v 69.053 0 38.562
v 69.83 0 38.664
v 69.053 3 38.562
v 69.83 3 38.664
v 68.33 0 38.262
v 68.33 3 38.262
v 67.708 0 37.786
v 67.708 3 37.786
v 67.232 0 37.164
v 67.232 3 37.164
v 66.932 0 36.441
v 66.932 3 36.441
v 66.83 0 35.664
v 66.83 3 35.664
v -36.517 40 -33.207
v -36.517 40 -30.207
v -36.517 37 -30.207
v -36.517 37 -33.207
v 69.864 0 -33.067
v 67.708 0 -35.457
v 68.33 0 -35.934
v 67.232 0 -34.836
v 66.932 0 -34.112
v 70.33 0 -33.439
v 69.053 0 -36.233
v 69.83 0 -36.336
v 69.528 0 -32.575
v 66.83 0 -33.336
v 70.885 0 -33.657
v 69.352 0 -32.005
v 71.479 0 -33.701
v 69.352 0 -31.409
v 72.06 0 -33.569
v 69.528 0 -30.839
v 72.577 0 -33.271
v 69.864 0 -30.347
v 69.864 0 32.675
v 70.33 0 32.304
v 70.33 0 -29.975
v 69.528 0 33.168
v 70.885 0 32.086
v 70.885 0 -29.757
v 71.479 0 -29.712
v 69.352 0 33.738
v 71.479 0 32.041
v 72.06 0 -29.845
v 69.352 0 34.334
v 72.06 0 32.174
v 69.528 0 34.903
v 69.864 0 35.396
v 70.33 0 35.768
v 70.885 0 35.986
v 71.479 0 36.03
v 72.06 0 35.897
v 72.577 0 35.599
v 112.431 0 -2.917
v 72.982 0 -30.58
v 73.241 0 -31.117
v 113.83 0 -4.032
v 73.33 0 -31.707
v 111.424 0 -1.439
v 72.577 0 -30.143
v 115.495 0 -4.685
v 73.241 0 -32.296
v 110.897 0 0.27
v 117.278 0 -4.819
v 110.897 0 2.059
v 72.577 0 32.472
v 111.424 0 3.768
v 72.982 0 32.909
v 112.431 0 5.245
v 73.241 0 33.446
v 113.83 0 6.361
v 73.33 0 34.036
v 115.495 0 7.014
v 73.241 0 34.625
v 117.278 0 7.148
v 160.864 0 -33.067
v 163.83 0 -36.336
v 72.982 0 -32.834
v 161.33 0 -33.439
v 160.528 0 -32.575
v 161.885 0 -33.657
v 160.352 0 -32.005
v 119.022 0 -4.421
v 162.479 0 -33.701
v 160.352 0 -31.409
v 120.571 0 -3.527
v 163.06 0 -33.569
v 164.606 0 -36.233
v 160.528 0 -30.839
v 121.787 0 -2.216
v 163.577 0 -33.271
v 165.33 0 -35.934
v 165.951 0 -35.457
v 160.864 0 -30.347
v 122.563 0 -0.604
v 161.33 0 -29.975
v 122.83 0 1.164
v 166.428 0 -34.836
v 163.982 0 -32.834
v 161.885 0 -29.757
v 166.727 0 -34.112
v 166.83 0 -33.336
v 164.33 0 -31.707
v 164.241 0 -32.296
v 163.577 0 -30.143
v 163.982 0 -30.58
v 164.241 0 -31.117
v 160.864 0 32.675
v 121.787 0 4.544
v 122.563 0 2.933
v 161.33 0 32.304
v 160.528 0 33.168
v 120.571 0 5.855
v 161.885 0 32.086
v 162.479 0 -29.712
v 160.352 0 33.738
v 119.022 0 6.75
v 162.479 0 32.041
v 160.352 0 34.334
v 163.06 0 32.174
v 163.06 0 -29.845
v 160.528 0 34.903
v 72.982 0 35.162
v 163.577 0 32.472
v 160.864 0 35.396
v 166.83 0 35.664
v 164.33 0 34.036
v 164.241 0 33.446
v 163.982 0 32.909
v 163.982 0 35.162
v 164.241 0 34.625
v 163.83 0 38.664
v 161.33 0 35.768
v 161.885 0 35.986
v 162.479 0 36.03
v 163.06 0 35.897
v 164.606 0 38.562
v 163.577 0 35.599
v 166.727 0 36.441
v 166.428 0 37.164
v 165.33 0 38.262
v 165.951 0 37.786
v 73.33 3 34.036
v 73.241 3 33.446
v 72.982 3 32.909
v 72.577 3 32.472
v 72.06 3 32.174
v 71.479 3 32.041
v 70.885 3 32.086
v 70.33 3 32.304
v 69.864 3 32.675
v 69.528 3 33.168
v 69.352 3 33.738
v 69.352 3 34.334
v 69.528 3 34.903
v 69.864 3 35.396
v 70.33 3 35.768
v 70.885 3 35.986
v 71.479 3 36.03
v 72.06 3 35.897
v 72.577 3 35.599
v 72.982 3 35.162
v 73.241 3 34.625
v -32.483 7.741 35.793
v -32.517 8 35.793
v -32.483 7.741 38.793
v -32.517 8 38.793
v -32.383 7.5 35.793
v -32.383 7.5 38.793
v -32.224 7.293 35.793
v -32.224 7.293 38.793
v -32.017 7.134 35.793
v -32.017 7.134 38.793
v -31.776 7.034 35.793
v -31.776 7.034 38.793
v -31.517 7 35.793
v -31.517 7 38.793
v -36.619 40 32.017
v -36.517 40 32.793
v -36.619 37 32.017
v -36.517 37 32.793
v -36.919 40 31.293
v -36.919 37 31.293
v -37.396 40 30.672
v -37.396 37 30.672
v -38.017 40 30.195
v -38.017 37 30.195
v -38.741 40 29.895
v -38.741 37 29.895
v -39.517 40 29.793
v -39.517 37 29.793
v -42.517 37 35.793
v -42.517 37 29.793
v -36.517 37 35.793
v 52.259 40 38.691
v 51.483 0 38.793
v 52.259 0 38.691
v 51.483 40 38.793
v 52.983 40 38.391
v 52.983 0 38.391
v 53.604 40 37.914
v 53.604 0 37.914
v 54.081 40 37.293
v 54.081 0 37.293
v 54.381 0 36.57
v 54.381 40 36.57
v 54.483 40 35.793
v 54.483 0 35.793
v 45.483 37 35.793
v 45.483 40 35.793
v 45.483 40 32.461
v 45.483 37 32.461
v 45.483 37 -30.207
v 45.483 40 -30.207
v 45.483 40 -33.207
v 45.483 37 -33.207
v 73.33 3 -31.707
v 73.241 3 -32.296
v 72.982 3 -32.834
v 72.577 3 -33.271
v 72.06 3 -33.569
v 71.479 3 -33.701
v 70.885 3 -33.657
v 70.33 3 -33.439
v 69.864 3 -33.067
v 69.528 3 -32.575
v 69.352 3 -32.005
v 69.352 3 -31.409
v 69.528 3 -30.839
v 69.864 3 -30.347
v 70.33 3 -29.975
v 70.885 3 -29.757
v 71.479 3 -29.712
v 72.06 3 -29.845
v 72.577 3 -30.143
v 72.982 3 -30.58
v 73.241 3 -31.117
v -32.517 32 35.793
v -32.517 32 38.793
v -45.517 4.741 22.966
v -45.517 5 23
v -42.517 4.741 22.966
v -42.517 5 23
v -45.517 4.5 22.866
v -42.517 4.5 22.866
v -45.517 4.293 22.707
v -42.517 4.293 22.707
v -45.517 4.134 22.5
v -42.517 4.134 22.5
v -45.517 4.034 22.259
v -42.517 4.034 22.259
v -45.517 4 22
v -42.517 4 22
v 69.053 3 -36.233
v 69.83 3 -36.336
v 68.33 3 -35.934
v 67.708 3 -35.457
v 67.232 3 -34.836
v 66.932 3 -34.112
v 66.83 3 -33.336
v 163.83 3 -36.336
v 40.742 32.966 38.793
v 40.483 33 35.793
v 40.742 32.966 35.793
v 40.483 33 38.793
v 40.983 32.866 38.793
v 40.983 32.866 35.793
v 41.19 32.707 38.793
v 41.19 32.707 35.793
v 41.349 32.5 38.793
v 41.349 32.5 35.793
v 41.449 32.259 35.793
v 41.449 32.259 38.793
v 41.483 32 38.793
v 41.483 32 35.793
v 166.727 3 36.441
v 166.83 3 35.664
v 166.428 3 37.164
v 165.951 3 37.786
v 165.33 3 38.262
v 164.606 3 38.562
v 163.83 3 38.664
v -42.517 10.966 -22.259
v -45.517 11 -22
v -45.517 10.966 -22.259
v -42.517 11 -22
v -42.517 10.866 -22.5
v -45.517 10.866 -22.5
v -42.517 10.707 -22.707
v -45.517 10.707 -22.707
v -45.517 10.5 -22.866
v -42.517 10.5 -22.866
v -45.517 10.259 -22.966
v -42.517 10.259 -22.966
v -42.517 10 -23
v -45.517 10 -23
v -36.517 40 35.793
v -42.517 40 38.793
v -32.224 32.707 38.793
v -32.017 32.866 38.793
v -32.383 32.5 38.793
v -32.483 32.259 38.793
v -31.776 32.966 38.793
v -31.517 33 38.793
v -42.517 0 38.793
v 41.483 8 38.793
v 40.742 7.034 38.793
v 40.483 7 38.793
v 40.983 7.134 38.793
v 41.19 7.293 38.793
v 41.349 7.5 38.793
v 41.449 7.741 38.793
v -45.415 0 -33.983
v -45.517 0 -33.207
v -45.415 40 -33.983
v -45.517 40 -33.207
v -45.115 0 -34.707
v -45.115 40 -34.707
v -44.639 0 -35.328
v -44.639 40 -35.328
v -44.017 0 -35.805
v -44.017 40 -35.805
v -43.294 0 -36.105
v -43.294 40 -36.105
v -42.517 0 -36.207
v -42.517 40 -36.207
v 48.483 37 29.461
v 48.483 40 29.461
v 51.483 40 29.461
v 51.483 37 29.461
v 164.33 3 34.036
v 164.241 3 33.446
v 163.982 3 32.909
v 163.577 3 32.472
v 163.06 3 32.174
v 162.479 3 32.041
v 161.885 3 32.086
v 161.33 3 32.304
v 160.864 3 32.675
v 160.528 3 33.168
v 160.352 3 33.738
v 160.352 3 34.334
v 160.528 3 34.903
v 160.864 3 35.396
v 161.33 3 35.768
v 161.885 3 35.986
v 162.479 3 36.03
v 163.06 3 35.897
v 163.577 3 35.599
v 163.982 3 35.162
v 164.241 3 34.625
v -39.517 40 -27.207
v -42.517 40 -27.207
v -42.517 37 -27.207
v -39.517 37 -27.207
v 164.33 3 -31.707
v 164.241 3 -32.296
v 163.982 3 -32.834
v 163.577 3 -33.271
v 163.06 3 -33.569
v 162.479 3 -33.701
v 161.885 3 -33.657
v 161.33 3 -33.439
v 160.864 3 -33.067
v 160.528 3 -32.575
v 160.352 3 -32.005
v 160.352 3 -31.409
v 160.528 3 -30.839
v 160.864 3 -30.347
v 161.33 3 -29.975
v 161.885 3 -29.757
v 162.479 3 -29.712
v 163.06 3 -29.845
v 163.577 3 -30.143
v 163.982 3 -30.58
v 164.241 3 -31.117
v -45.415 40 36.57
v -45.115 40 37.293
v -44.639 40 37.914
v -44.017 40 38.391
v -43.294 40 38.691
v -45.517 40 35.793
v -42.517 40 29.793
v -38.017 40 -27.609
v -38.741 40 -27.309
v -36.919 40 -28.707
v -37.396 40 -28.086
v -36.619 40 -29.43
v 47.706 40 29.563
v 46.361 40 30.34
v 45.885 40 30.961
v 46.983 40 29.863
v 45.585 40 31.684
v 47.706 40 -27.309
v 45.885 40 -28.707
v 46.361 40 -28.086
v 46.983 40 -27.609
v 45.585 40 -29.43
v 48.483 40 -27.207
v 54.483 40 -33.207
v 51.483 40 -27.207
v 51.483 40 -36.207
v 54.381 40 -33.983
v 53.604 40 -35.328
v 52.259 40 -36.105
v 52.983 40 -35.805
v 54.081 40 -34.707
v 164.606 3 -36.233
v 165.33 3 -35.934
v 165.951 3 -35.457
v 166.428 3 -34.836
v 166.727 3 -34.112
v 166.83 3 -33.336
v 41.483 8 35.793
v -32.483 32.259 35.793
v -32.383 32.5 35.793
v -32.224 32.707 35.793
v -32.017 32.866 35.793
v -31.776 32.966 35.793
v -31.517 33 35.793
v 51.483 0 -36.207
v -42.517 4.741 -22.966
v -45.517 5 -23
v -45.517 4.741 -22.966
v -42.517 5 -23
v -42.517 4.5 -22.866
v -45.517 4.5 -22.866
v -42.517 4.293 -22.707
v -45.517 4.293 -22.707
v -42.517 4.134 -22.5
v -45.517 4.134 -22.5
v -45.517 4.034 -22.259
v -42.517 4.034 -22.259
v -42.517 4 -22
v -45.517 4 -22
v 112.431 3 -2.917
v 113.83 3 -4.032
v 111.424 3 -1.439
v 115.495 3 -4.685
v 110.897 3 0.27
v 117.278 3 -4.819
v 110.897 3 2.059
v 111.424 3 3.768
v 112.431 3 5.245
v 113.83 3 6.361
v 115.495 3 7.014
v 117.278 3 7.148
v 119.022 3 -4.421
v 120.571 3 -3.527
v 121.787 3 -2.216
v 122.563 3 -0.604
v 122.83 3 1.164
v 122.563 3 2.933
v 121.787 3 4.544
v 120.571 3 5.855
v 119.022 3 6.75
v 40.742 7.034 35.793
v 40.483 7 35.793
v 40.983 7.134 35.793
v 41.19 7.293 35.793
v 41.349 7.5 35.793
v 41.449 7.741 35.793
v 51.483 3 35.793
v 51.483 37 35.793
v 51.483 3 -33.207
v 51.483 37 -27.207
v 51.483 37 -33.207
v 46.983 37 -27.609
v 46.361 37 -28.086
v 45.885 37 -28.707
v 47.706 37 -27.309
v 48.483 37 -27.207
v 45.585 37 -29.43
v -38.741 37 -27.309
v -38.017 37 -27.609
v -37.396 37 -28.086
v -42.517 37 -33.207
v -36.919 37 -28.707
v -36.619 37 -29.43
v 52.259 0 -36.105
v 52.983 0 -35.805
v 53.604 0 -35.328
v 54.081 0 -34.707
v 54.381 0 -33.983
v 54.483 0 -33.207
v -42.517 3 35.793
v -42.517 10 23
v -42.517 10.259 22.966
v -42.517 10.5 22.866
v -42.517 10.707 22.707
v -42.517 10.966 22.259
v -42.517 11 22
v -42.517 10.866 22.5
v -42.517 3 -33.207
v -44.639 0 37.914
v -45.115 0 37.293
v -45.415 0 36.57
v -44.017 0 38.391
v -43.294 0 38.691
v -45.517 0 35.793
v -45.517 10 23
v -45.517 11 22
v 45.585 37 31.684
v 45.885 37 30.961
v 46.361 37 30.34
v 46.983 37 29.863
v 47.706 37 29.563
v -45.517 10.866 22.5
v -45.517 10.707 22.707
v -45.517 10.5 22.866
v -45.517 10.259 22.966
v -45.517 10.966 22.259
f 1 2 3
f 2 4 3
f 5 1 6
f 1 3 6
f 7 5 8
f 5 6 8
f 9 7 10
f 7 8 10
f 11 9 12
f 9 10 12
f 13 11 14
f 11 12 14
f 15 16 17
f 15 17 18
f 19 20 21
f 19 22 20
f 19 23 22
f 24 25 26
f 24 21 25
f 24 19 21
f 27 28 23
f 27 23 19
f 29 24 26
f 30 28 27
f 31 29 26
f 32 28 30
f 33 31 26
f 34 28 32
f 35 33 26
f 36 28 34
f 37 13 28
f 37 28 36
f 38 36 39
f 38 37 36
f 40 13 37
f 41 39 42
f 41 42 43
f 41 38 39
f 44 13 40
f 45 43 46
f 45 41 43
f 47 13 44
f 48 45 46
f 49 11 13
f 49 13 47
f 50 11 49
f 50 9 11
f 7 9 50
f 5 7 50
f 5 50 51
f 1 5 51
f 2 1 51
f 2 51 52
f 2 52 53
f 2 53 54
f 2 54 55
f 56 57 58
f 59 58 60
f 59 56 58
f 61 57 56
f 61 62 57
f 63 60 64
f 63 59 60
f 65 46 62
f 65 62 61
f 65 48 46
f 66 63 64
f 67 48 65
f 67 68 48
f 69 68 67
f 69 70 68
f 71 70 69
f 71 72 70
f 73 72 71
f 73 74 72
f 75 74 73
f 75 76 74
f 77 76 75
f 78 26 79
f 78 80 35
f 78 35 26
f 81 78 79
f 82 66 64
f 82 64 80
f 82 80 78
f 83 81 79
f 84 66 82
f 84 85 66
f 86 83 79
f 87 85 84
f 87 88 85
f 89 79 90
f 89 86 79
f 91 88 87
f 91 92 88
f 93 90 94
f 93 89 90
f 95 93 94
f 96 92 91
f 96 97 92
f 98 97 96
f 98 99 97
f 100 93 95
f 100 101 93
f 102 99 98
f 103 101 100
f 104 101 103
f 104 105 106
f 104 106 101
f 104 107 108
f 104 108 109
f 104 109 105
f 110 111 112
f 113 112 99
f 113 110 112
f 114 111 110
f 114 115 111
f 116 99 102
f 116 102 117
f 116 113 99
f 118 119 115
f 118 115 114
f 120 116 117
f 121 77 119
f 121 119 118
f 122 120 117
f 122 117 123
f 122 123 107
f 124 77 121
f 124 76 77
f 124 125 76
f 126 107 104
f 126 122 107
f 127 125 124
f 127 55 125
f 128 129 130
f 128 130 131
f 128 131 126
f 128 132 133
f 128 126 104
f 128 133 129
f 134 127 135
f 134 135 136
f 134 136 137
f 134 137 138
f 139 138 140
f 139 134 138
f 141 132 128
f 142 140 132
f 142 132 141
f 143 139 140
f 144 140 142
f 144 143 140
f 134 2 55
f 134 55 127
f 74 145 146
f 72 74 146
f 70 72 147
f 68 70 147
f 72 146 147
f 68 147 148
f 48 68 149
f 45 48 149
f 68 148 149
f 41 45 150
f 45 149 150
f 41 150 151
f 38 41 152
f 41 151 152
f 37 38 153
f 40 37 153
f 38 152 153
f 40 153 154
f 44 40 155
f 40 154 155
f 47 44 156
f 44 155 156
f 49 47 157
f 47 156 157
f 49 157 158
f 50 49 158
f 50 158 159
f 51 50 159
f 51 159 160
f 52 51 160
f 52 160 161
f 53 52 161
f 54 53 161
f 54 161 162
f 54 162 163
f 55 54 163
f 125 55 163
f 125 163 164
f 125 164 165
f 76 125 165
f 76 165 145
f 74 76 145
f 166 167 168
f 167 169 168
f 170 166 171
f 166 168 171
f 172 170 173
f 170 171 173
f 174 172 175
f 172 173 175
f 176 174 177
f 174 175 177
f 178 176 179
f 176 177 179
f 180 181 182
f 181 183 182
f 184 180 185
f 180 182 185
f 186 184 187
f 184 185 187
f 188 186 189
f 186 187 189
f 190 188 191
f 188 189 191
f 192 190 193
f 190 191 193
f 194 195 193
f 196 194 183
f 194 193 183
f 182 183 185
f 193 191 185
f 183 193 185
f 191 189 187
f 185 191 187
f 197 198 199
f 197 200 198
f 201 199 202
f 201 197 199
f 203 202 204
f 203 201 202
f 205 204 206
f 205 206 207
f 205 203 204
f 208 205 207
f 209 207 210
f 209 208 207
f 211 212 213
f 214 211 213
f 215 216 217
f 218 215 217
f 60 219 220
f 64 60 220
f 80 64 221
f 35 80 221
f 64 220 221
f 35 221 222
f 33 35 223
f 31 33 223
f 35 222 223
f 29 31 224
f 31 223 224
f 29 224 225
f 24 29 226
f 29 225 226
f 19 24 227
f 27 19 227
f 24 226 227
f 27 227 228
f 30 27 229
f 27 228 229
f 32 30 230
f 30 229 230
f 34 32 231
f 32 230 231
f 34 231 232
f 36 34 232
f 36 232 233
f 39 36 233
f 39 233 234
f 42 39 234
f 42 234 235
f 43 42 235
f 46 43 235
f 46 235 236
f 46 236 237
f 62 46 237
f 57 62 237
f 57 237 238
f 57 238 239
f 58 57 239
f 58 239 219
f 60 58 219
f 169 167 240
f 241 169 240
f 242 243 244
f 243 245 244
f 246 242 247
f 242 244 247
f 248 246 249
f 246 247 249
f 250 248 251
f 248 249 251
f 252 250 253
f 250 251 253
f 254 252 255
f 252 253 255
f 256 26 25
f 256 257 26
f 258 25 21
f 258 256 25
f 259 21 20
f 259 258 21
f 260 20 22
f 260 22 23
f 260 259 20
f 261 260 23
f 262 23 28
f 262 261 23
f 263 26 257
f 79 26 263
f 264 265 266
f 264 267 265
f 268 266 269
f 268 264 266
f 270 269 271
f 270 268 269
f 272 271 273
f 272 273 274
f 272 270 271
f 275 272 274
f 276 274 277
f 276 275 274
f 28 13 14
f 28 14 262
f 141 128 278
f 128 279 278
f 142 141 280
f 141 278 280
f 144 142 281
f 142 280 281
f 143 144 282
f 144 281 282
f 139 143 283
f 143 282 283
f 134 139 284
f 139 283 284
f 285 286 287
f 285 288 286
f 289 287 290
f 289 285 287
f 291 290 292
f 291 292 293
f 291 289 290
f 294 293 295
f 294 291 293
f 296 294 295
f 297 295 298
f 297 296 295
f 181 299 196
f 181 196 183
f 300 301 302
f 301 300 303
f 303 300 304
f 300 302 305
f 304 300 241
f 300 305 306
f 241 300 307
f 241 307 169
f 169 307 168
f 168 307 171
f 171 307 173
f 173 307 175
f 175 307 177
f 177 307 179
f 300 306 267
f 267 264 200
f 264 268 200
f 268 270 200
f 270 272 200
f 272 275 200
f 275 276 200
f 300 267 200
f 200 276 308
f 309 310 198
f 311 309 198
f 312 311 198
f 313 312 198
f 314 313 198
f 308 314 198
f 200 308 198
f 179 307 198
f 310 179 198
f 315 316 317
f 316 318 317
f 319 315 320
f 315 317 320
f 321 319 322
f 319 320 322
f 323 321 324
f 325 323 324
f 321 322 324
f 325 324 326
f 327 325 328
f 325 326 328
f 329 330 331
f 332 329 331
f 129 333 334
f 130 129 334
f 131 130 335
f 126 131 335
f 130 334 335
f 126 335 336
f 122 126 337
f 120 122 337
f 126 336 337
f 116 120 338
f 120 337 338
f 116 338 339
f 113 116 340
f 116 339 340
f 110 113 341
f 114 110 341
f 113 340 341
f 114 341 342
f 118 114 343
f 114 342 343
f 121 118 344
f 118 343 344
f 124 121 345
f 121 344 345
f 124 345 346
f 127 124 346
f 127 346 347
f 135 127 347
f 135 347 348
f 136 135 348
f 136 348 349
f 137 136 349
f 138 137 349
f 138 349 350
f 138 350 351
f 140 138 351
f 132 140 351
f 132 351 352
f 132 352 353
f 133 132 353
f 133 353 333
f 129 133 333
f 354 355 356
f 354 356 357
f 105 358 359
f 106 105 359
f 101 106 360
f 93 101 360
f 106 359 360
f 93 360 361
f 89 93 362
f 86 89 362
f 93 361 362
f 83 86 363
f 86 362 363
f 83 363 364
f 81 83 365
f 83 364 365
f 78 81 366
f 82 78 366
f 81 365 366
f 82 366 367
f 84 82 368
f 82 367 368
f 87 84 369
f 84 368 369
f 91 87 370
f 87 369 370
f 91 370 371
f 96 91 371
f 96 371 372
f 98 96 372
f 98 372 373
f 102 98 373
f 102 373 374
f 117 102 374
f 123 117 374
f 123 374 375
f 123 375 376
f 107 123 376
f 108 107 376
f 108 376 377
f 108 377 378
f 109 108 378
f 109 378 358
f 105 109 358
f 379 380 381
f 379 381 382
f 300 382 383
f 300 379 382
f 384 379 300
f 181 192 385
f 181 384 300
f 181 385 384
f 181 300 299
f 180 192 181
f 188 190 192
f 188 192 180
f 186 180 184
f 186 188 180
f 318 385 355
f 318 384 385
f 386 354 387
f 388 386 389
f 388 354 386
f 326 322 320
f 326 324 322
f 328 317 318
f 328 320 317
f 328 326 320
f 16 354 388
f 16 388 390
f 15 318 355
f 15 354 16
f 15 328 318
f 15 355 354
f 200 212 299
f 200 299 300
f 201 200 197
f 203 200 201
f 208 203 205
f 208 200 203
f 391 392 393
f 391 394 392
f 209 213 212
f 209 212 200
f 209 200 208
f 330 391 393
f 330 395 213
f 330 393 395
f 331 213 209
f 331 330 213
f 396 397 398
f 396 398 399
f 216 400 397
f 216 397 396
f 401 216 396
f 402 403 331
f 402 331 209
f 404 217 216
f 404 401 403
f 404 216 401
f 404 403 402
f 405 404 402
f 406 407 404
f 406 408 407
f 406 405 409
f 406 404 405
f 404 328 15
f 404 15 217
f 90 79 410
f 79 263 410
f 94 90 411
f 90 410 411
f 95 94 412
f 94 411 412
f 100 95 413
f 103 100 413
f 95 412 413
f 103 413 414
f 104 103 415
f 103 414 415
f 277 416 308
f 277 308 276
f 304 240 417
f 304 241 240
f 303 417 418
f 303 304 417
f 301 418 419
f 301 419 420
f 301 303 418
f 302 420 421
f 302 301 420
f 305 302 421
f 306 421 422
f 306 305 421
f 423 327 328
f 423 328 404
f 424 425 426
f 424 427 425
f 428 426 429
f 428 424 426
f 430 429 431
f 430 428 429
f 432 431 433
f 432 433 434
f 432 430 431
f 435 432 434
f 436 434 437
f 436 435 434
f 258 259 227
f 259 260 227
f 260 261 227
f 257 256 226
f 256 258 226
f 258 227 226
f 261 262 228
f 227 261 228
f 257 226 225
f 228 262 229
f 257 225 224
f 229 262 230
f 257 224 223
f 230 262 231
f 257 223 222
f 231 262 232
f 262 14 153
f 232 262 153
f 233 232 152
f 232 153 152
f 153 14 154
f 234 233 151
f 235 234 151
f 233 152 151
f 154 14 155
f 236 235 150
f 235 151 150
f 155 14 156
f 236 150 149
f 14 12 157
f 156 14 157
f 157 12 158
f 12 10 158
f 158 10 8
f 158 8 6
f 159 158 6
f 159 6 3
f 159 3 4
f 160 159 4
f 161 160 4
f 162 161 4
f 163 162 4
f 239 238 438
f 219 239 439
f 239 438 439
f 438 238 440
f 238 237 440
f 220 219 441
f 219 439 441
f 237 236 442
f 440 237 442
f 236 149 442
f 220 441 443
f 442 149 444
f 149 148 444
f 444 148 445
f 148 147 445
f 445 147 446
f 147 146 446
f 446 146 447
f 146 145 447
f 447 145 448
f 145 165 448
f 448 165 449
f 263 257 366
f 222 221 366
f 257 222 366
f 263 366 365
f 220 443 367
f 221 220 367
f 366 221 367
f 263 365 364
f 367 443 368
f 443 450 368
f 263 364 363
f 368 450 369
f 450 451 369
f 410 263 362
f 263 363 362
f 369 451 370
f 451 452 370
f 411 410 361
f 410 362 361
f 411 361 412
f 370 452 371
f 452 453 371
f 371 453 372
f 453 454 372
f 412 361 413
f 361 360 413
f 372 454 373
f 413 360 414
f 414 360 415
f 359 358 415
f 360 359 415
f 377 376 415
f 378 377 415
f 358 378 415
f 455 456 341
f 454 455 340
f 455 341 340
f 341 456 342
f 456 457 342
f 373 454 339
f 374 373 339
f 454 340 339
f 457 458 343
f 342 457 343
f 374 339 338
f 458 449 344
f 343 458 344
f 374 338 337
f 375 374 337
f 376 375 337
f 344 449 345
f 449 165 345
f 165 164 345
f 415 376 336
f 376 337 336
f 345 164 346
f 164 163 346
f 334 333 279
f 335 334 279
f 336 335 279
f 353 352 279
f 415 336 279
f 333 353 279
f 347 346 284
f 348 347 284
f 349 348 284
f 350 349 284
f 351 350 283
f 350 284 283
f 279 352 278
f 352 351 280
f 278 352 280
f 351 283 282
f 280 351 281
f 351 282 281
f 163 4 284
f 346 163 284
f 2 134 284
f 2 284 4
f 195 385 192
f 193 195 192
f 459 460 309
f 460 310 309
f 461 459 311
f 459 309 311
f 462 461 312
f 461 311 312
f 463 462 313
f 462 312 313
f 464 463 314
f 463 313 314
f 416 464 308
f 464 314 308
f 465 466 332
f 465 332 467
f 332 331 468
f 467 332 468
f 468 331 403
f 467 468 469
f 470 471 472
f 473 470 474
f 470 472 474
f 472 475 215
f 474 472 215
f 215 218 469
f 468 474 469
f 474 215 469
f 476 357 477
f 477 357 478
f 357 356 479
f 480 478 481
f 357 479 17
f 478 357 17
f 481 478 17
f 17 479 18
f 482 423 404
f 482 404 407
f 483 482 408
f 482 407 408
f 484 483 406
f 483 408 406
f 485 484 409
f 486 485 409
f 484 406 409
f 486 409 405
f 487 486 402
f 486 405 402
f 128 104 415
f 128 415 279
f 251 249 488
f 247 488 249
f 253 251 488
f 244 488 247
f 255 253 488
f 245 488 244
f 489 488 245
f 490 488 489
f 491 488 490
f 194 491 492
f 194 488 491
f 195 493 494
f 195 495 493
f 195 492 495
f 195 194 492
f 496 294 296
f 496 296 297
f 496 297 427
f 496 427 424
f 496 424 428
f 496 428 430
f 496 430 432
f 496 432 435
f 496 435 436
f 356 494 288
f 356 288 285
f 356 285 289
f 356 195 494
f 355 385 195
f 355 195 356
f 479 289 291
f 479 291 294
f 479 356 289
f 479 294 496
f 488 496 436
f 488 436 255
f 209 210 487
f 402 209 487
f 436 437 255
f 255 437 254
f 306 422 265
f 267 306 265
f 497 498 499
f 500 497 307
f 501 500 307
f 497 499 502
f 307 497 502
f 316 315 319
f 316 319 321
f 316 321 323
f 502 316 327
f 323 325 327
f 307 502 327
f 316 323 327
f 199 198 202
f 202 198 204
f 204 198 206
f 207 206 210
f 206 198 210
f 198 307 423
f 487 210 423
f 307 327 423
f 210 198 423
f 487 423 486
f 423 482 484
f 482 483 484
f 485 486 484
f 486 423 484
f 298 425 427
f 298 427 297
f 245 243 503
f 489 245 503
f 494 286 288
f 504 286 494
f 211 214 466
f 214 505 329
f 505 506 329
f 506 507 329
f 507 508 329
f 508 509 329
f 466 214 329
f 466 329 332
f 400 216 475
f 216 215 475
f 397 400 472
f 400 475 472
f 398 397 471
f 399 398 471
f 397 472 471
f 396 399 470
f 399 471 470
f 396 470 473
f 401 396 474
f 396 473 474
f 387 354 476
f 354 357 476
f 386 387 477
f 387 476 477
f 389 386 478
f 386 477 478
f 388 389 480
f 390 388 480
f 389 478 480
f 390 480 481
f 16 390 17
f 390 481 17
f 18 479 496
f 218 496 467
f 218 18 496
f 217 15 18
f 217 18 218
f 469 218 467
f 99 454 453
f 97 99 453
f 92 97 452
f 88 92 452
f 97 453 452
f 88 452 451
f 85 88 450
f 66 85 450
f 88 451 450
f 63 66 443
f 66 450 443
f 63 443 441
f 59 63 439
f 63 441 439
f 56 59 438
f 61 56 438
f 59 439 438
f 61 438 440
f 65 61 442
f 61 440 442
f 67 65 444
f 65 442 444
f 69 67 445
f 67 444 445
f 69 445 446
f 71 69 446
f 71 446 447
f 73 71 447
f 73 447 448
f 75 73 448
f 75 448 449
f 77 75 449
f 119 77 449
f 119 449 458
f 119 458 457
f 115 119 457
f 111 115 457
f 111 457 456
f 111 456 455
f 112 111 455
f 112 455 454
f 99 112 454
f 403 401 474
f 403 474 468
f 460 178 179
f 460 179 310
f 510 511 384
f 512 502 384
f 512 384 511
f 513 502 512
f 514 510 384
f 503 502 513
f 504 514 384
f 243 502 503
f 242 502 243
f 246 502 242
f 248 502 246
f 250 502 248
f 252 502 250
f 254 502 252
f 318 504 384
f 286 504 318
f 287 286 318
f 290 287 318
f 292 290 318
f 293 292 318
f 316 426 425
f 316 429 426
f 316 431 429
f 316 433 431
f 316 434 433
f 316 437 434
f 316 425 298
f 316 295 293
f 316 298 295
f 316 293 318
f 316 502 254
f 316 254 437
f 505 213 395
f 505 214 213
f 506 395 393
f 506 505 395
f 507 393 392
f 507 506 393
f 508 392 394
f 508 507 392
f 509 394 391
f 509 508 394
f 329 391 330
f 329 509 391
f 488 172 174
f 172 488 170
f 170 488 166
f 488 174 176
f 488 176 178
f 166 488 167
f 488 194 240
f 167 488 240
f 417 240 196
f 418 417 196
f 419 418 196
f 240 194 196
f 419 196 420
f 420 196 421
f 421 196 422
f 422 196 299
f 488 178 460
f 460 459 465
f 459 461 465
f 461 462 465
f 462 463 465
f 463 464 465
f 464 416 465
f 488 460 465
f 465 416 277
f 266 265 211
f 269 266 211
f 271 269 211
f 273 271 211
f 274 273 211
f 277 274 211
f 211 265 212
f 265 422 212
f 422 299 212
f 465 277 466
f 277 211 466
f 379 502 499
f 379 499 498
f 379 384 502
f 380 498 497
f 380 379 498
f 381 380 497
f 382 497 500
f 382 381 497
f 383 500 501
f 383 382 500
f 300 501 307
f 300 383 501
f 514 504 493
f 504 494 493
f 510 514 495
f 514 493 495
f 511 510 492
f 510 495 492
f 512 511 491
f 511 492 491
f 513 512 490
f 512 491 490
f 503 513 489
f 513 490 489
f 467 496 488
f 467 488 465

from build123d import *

# Parameters (mm, degrees)
IZIM2_W                     = 100
IZIM2_H                     = 75
Y_KSEKLIK_EKSTR_ZYON1_DEPTH = 40
IZIM4_W                     = 94
IZIM4_H                     = 69
KES_EKSTR_ZYON1_DEPTH       = 37
IZIM6_W                     = 74
IZIM6_H                     = 26
KES_EKSTR_ZYON2_DEPTH       = 218
IZIM7_W                     = 46
IZIM7_H                     = 7
KES_EKSTR_ZYON3_DEPTH       = 30
RADYUS1_R                   = 3
IZIM9_W                     = 6
IZIM9_H                     = 6
Y_KSEKLIK_EKSTR_ZYON2_DEPTH = 3
RADYUS2_R                   = 3
IZIM11_W                    = 6
IZIM11_H                    = 6
Y_KSEKLIK_EKSTR_ZYON3_DEPTH = 3
RADYUS3_R                   = 3
IZIM12_W                    = 6
IZIM12_H                    = 6
Y_KSEKLIK_EKSTR_ZYON4_DEPTH = 3
IZIM13_W                    = 6
IZIM13_H                    = 6.332172704
Y_KSEKLIK_EKSTR_ZYON5_DEPTH = 3
RADYUS4_R                   = 3
RADYUS5_R                   = 1
RADYUS7_R                   = 1
Y_KSEKLIK_EKSTR_ZYON6_DEPTH = 3
RADYUS10_R                  = 3
IZIM16_R                    = 6
KES_EKSTR_ZYON4_DEPTH       = 31
KES_EKSTR_ZYON4_DEPTH_BACK  = 34
IZIM17_R                    = 2
KES_EKSTR_ZYON5_DEPTH       = 20


with BuildPart() as part:
    # Çizim2 → Yükseklik-Ekstrüzyon1 (new body)
    with BuildSketch(Plane(origin=(0, 0, 0), x_dir=(1, 0, 0), z_dir=(0, 1, 0))):
        with Locations((4.482758621, -1.293103448)):
            Rectangle(IZIM2_W, IZIM2_H)
    extrude(amount=Y_KSEKLIK_EKSTR_ZYON1_DEPTH)

    # Çizim4 → Kes-Ekstrüzyon1 (cut)
    with BuildSketch(Plane(origin=(0, 40, 0), x_dir=(1, 0, 0), z_dir=(0, 1, 0))):
        with Locations((4.482758621, -1.293103448)):
            Rectangle(IZIM4_W, IZIM4_H)
    extrude(amount=-KES_EKSTR_ZYON1_DEPTH, mode=Mode.SUBTRACT)

    # Çizim6 → Kes-Ekstrüzyon2 (cut)
    with BuildSketch(Plane.XY):
        with Locations((4.482758621, 20)):
            Rectangle(IZIM6_W, IZIM6_H)
    extrude(amount=KES_EKSTR_ZYON2_DEPTH, mode=Mode.SUBTRACT)

    # Çizim7 → Kes-Ekstrüzyon3 (cut)
    with BuildSketch(Plane.ZY.offset(45.517241379)):
        with Locations((0, 7.5)):
            Rectangle(IZIM7_W, IZIM7_H)
    extrude(amount=-KES_EKSTR_ZYON3_DEPTH, mode=Mode.SUBTRACT)

    # Radyus1
    radyus1_edges = [part.edges().sort_by_distance(p)[0] for p in [
        (-45.517241379, 20, -36.206896552),
        (54.482758621, 20, -36.206896552),
        (54.482758621, 20, 38.793103448),
        (-45.517241379, 20, 38.793103448),
    ]]
    fillet(radyus1_edges, radius=RADYUS1_R)

    # Çizim9 → Yükseklik-Ekstrüzyon2 (add)
    with BuildSketch(Plane(origin=(0, 40, 0), x_dir=(1, 0, 0), z_dir=(0, 1, 0))):
        with Locations((-39.517241379, 30.206896552)):
            Rectangle(IZIM9_W, IZIM9_H)
    extrude(amount=-Y_KSEKLIK_EKSTR_ZYON2_DEPTH)

    # Radyus2
    radyus2_edges = [part.edges().sort_by_distance(p)[0] for p in [
        (-36.517241379, 38.5, -27.206896552),
    ]]
    fillet(radyus2_edges, radius=RADYUS2_R)

    # Çizim11 → Yükseklik-Ekstrüzyon3 (add)
    with BuildSketch(Plane(origin=(0, 40, 0), x_dir=(1, 0, 0), z_dir=(0, 1, 0))):
        with Locations((48.482758621, 30.206896552)):
            Rectangle(IZIM11_W, IZIM11_H)
    extrude(amount=-Y_KSEKLIK_EKSTR_ZYON3_DEPTH)

    # Radyus3
    radyus3_edges = [part.edges().sort_by_distance(p)[0] for p in [
        (45.482758621, 38.5, -27.206896552),
    ]]
    fillet(radyus3_edges, radius=RADYUS3_R)

    # Çizim12 → Yükseklik-Ekstrüzyon4 (add)
    with BuildSketch(Plane(origin=(0, 40, 0), x_dir=(1, 0, 0), z_dir=(0, 1, 0))):
        with Locations((-39.517241379, -32.793103448)):
            Rectangle(IZIM12_W, IZIM12_H)
    extrude(amount=-Y_KSEKLIK_EKSTR_ZYON4_DEPTH)

    # Çizim13 → Yükseklik-Ekstrüzyon5 (add)
    with BuildSketch(Plane(origin=(0, 40, 0), x_dir=(1, 0, 0), z_dir=(0, 1, 0))):
        with Locations((48.482758621, -32.627017096)):
            Rectangle(IZIM13_W, IZIM13_H)
    extrude(amount=-Y_KSEKLIK_EKSTR_ZYON5_DEPTH)

    # Radyus4
    radyus4_edges = [part.edges().sort_by_distance(p)[0] for p in [
        (-36.517241379, 38.5, 29.793103448),
        (45.482758621, 38.5, 29.460930744),
    ]]
    fillet(radyus4_edges, radius=RADYUS4_R)

    # Radyus5
    radyus5_edges = [part.edges().sort_by_distance(p)[0] for p in [
        (-44.017241379, 4, -23),
        (-44.017241379, 11, -23),
        (-44.017241379, 11, 23),
        (-44.017241379, 4, 23),
    ]]
    fillet(radyus5_edges, radius=RADYUS5_R)

    # Radyus7
    radyus7_edges = [part.edges().sort_by_distance(p)[0] for p in [
        (-32.517241379, 33, 37.293103448),
        (-32.517241379, 7, 37.293103448),
        (41.482758621, 7, 37.293103448),
        (41.482758621, 33, 37.293103448),
    ]]
    fillet(radyus7_edges, radius=RADYUS7_R)


with BuildPart() as body_2:
    # Çizim15 → Yükseklik-Ekstrüzyon6 (new body)
    with BuildSketch(Plane.XZ):
        Polygon((66.829636108, 35.664414978), (66.829636108, -36.335585022), (166.829636108, -36.335585022), (166.829636108, 38.664414978), (66.829636108, 38.664414978), align=None)
    extrude(amount=-Y_KSEKLIK_EKSTR_ZYON6_DEPTH)

    # Radyus10
    radyus10_edges = [body_2.edges().sort_by_distance(p)[0] for p in [
        (66.829636108, 1.5, 38.664414978),
        (166.829636108, 1.5, 38.664414978),
        (166.829636108, 1.5, -36.335585022),
        (66.829636108, 1.5, -36.335585022),
    ]]
    fillet(radyus10_edges, radius=RADYUS10_R)

    # Çizim16 → Kes-Ekstrüzyon4 (cut, two sides)
    with BuildSketch(Plane(origin=(0, 3, 0), x_dir=(1, 0, 0), z_dir=(0, 1, 0))) as kes_ekstr_zyon4_sk:
        with Locations((116.829636108, -1.164414978)):
            Circle(IZIM16_R)
    extrude(amount=KES_EKSTR_ZYON4_DEPTH, mode=Mode.SUBTRACT)
    extrude(kes_ekstr_zyon4_sk.sketch, amount=-KES_EKSTR_ZYON4_DEPTH_BACK, mode=Mode.SUBTRACT)

    # Çizim17 → Kes-Ekstrüzyon5 (cut)
    with BuildSketch(Plane(origin=(0, 3, 0), x_dir=(1, 0, 0), z_dir=(0, 1, 0))):
        with Locations((162.329636108, -34.035726507)):
            Circle(IZIM17_R)
        with Locations((71.329636108, -34.035726507)):
            Circle(IZIM17_R)
        with Locations((71.329636108, 31.706896552)):
            Circle(IZIM17_R)
        with Locations((162.329636108, 31.706896552)):
            Circle(IZIM17_R)
    extrude(amount=-KES_EKSTR_ZYON5_DEPTH, mode=Mode.SUBTRACT)


solid = Compound([part.part, body_2.part])
